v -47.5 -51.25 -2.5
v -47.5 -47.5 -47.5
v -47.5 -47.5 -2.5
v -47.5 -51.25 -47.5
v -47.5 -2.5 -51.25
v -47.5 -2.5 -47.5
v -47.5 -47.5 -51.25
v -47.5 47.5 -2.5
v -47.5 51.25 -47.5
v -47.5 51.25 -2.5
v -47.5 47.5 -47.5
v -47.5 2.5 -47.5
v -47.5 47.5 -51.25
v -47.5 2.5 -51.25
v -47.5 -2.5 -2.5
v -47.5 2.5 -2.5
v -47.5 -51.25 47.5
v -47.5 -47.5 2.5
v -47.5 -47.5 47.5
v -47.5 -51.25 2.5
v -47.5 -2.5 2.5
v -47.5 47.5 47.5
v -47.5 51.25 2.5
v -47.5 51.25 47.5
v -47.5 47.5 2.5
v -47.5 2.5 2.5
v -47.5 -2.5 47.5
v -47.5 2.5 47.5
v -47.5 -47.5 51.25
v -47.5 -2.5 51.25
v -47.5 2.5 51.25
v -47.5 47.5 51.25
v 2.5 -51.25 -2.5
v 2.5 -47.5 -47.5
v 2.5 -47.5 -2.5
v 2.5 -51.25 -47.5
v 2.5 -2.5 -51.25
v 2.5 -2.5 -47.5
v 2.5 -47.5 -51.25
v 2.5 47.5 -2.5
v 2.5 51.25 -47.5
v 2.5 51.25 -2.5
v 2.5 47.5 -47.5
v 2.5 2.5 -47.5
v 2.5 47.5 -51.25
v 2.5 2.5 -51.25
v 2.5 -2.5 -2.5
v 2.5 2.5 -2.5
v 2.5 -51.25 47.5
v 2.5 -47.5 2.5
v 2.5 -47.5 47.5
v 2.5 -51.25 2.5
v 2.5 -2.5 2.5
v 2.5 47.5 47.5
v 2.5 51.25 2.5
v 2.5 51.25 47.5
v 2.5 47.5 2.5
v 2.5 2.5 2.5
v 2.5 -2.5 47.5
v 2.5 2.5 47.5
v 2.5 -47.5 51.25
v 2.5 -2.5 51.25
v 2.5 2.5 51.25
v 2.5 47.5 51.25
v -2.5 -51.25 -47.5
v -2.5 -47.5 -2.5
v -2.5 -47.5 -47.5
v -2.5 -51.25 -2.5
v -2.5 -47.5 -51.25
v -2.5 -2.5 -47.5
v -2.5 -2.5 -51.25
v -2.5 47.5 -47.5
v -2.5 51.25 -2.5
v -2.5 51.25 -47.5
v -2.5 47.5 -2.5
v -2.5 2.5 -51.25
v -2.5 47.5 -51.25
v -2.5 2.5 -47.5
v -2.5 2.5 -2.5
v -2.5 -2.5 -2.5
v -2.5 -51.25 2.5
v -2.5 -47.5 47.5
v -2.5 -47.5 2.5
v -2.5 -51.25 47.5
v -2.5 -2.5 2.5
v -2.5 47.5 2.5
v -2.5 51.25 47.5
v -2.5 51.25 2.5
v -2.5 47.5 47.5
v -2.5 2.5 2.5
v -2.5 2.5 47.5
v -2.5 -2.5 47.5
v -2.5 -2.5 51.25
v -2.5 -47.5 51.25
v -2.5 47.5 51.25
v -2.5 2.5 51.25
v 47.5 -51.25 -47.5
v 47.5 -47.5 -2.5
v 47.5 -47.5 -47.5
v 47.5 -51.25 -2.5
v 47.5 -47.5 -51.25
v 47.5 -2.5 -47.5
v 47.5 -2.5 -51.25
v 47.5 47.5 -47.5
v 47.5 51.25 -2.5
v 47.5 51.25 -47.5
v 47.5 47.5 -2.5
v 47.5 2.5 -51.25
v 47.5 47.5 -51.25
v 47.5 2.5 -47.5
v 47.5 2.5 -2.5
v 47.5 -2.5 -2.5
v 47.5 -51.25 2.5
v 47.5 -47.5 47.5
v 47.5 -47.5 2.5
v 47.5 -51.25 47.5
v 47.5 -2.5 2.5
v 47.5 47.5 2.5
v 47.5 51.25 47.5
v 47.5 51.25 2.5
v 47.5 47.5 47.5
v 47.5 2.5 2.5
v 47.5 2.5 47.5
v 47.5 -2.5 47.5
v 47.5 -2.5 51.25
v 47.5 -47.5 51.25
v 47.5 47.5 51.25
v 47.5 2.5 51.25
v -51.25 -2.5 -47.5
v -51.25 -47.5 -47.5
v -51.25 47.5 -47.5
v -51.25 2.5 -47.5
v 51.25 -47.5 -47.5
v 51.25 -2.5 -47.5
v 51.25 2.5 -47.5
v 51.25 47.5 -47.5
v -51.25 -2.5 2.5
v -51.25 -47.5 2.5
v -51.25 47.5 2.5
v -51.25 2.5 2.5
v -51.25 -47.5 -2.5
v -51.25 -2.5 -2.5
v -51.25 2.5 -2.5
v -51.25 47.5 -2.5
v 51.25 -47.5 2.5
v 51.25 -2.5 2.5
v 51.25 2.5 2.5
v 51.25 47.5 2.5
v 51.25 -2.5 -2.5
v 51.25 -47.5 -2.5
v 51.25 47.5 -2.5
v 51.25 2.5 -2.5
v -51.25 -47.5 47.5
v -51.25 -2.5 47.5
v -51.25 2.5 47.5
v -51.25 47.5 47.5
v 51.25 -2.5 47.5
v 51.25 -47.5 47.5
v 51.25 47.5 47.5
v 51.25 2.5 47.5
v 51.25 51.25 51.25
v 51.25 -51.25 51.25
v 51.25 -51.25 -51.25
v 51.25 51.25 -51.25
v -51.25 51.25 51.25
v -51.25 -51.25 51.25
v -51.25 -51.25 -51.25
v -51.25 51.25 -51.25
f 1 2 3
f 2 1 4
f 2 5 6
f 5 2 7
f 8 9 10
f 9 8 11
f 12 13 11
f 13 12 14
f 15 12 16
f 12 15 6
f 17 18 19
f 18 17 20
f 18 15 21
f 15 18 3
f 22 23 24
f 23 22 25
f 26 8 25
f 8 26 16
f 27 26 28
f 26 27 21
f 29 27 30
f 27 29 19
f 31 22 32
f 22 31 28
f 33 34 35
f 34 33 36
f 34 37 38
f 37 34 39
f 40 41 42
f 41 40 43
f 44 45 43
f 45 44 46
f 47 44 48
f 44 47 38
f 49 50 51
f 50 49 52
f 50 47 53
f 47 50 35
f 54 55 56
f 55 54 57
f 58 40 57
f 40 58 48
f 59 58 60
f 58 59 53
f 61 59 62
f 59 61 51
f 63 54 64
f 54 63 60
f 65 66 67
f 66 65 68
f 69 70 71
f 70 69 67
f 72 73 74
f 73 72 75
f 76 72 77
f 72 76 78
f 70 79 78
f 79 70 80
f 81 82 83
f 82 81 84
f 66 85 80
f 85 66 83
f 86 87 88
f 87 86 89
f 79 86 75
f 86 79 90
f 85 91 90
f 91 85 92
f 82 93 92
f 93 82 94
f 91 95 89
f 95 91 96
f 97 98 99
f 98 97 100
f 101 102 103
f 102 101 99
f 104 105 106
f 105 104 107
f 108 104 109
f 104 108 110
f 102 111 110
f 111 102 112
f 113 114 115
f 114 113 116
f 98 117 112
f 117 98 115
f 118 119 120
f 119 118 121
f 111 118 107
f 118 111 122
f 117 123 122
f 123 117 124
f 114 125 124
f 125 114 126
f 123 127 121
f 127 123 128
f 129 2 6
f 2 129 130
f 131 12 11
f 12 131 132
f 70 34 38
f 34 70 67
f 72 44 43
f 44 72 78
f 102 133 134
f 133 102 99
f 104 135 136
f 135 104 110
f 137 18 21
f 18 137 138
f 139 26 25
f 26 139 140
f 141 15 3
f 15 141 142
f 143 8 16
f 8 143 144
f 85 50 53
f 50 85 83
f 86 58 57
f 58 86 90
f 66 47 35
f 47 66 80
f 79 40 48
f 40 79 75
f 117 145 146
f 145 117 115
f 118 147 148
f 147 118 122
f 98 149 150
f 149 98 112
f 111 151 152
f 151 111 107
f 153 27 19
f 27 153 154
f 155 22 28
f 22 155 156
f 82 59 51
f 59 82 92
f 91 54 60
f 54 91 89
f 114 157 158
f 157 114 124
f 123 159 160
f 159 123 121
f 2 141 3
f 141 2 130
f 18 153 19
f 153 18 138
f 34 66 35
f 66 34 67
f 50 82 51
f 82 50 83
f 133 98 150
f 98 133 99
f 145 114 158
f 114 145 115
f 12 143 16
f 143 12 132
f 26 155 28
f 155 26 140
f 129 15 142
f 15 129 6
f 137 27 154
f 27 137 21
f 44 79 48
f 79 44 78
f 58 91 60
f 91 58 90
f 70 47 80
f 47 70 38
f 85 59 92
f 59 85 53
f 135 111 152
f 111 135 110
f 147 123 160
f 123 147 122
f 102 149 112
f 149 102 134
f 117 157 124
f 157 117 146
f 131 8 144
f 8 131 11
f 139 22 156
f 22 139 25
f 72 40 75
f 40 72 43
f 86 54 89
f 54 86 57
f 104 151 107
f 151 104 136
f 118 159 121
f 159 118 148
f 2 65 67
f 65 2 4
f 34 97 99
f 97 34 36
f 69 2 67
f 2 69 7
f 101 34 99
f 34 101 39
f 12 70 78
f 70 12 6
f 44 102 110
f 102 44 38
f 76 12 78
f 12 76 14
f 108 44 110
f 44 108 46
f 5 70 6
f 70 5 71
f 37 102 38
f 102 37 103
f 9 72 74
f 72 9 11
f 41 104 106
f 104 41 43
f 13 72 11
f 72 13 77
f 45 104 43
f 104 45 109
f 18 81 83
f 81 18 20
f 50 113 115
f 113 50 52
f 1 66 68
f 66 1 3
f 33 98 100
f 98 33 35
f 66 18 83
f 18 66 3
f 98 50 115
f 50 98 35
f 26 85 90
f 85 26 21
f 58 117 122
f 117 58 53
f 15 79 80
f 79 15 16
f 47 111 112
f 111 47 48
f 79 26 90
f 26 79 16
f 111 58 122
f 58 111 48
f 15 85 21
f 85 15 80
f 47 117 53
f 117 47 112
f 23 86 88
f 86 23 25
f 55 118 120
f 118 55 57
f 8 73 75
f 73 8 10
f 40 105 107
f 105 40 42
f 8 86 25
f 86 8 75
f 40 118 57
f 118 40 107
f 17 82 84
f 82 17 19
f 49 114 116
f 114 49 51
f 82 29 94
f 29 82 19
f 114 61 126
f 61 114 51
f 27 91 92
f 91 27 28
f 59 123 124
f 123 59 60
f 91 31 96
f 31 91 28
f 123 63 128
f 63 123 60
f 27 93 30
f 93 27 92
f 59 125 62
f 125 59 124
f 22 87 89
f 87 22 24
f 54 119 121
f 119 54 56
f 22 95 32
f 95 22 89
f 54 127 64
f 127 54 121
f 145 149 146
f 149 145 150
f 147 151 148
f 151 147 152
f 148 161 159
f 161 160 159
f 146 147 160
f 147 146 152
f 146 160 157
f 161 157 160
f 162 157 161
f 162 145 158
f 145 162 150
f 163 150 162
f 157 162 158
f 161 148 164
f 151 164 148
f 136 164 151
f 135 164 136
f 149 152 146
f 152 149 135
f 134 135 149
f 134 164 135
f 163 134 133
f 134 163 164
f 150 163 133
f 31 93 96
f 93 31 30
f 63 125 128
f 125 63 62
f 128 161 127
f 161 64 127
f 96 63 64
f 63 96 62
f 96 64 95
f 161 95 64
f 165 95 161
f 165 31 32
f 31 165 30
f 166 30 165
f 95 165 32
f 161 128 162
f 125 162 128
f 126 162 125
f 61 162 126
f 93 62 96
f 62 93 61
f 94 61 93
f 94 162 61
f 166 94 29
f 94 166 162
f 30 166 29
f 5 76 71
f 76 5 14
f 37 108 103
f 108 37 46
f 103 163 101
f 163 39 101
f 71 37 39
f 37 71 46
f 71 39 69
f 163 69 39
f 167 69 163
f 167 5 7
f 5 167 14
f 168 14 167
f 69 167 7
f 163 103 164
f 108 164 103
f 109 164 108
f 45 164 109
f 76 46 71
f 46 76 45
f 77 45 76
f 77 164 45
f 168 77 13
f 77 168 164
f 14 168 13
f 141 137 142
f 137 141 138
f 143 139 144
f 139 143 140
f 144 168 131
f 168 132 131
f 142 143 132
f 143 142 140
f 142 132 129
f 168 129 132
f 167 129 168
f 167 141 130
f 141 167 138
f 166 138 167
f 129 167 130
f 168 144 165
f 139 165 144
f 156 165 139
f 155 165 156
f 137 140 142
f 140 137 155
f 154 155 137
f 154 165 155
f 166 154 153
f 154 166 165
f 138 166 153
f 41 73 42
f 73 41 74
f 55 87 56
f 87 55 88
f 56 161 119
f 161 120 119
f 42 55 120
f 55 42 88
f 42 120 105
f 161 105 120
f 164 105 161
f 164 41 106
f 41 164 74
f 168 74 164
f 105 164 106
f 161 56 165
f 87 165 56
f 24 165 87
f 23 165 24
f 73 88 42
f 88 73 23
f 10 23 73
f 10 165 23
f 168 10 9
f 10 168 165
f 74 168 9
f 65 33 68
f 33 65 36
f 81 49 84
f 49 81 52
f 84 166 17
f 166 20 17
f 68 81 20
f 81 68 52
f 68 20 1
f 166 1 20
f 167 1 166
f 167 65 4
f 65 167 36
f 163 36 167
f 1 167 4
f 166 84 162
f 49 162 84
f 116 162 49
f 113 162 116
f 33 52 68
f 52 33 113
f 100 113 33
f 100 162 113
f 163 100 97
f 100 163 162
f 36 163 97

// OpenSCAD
// Meta-material Grid Generetator

// Hiroya Tanaka 
// Director, Social Fabrication Lab
// Professor, Keio University SFC
// 2018.04.22 in Den Haag (Netherland) ibis Hotel 
// 2018.05.11 in Kamakura (Japan) Home



echo(version=version());


frame_width=5;			// [0:255]

outer_frame_width=1;			// [0:255]

xy_pitch=50;         		// [0:255]

z_pitch=50;                    // [0:255]

x_rotation=0;			// [0:360]

y_rotation=0;			// [0:360]

z_rotation=0;			// [0:360]


// example:


render(convexity = 1) intersection(){
   cube(100+frame_width/2,true);
   structure();
  
}
 frame();



module structure(){
union(){
xggrid(frame_width,xy_pitch,frame_width,z_pitch,x_rotation,y_rotation,z_rotation);
yggrid(frame_width,xy_pitch,frame_width,z_pitch,x_rotation,y_rotation,z_rotation);
zggrid(frame_width,xy_pitch,frame_width,z_pitch,x_rotation,y_rotation,z_rotation);
 }
 }
 
module xggrid(xy_l,xy_p,z_l,z_p,x_r,y_r,z_r){
       
    
    for(zz=[-100:z_p:100])
    
    for(xx=[-100:xy_p:100])       
    
        //echo(xx,zz);
    rotate([x_r,y_r,z_r])
    
    translate([xx,0,zz])    
    cube([xy_l,200,xy_l],true);
      
    
    


}

module yggrid(xy_l,xy_p,z_l,z_p,x_r,y_r,z_r){
    
    for(yy=[-100:xy_p:100])
    
    for(xx=[-100:xy_p:100])       
    
        //echo(xx,zz);
    rotate([x_r,y_r,z_r])
    
    translate([xx,yy,0])    
    cube([xy_l,xy_l,200],true);
      
    
    

}

module zggrid(xy_l,xy_p,z_l,z_p,x_r,y_r,z_r){
    
    
    for(zz=[-100:z_p:100])
    
    for(yy=[-100:xy_p:100])       
    
        //echo(xx,zz);
    rotate([x_r,y_r,z_r])
    
    translate([0,yy,zz])    
    cube([200,xy_l,xy_l],true);
      
    
    
}
    
        
    

module frame(){
union(){
fxggrid(outer_frame_width,xy_pitch,frame_width,z_pitch,x_rotation,y_rotation,z_rotation);
fyggrid(outer_frame_width,xy_pitch,frame_width,z_pitch,x_rotation,y_rotation,z_rotation);
fzggrid(outer_frame_width,xy_pitch,frame_width,z_pitch,x_rotation,y_rotation,z_rotation);
 }
 }
 
module fxggrid(xy_l,xy_p,z_l,z_p,x_r,y_r,z_r){
       
    
    for(zz=[-50:100:-50]){
    
    for(xx=[-50:xy_p:50]){       
    translate([xx,0,zz])    
    cube([xy_l,100+xy_l,xy_l],true);
    }
    
    for(xx=[-50:xy_p:50]){       
    translate([0,xx,zz])    
    cube([100+xy_l, xy_l,xy_l],true);
    }
}
}  
    
    


    
   module fyggrid(xy_l,xy_p,z_l,z_p,x_r,y_r,z_r){
       
    
    for(yy=[-50:100:50]){
    
    for(xx=[-50:xy_p:50]){       
    translate([xx,yy,0])    
    cube([xy_l,xy_l,100+xy_l],true);
    }
    
    for(xx=[-50:xy_p:50]){       
    translate([0,yy,xx])    
    cube([100+xy_l, xy_l,xy_l],true);
    }
}
}       
    

   module fzggrid(xy_l,xy_p,z_l,z_p,x_r,y_r,z_r){
       
    
    for(xx=[-50:100:50]){
    
    for(yy=[-50:xy_p:50]){       
    translate([xx,0,yy])    
    cube([xy_l,100+xy_l,xy_l],true);
    }
    
    for(yy=[-50:xy_p:50]){       
    translate([xx,yy,0])    
    cube([xy_l,xy_l,100+xy_l],true);
    }
}
}    
